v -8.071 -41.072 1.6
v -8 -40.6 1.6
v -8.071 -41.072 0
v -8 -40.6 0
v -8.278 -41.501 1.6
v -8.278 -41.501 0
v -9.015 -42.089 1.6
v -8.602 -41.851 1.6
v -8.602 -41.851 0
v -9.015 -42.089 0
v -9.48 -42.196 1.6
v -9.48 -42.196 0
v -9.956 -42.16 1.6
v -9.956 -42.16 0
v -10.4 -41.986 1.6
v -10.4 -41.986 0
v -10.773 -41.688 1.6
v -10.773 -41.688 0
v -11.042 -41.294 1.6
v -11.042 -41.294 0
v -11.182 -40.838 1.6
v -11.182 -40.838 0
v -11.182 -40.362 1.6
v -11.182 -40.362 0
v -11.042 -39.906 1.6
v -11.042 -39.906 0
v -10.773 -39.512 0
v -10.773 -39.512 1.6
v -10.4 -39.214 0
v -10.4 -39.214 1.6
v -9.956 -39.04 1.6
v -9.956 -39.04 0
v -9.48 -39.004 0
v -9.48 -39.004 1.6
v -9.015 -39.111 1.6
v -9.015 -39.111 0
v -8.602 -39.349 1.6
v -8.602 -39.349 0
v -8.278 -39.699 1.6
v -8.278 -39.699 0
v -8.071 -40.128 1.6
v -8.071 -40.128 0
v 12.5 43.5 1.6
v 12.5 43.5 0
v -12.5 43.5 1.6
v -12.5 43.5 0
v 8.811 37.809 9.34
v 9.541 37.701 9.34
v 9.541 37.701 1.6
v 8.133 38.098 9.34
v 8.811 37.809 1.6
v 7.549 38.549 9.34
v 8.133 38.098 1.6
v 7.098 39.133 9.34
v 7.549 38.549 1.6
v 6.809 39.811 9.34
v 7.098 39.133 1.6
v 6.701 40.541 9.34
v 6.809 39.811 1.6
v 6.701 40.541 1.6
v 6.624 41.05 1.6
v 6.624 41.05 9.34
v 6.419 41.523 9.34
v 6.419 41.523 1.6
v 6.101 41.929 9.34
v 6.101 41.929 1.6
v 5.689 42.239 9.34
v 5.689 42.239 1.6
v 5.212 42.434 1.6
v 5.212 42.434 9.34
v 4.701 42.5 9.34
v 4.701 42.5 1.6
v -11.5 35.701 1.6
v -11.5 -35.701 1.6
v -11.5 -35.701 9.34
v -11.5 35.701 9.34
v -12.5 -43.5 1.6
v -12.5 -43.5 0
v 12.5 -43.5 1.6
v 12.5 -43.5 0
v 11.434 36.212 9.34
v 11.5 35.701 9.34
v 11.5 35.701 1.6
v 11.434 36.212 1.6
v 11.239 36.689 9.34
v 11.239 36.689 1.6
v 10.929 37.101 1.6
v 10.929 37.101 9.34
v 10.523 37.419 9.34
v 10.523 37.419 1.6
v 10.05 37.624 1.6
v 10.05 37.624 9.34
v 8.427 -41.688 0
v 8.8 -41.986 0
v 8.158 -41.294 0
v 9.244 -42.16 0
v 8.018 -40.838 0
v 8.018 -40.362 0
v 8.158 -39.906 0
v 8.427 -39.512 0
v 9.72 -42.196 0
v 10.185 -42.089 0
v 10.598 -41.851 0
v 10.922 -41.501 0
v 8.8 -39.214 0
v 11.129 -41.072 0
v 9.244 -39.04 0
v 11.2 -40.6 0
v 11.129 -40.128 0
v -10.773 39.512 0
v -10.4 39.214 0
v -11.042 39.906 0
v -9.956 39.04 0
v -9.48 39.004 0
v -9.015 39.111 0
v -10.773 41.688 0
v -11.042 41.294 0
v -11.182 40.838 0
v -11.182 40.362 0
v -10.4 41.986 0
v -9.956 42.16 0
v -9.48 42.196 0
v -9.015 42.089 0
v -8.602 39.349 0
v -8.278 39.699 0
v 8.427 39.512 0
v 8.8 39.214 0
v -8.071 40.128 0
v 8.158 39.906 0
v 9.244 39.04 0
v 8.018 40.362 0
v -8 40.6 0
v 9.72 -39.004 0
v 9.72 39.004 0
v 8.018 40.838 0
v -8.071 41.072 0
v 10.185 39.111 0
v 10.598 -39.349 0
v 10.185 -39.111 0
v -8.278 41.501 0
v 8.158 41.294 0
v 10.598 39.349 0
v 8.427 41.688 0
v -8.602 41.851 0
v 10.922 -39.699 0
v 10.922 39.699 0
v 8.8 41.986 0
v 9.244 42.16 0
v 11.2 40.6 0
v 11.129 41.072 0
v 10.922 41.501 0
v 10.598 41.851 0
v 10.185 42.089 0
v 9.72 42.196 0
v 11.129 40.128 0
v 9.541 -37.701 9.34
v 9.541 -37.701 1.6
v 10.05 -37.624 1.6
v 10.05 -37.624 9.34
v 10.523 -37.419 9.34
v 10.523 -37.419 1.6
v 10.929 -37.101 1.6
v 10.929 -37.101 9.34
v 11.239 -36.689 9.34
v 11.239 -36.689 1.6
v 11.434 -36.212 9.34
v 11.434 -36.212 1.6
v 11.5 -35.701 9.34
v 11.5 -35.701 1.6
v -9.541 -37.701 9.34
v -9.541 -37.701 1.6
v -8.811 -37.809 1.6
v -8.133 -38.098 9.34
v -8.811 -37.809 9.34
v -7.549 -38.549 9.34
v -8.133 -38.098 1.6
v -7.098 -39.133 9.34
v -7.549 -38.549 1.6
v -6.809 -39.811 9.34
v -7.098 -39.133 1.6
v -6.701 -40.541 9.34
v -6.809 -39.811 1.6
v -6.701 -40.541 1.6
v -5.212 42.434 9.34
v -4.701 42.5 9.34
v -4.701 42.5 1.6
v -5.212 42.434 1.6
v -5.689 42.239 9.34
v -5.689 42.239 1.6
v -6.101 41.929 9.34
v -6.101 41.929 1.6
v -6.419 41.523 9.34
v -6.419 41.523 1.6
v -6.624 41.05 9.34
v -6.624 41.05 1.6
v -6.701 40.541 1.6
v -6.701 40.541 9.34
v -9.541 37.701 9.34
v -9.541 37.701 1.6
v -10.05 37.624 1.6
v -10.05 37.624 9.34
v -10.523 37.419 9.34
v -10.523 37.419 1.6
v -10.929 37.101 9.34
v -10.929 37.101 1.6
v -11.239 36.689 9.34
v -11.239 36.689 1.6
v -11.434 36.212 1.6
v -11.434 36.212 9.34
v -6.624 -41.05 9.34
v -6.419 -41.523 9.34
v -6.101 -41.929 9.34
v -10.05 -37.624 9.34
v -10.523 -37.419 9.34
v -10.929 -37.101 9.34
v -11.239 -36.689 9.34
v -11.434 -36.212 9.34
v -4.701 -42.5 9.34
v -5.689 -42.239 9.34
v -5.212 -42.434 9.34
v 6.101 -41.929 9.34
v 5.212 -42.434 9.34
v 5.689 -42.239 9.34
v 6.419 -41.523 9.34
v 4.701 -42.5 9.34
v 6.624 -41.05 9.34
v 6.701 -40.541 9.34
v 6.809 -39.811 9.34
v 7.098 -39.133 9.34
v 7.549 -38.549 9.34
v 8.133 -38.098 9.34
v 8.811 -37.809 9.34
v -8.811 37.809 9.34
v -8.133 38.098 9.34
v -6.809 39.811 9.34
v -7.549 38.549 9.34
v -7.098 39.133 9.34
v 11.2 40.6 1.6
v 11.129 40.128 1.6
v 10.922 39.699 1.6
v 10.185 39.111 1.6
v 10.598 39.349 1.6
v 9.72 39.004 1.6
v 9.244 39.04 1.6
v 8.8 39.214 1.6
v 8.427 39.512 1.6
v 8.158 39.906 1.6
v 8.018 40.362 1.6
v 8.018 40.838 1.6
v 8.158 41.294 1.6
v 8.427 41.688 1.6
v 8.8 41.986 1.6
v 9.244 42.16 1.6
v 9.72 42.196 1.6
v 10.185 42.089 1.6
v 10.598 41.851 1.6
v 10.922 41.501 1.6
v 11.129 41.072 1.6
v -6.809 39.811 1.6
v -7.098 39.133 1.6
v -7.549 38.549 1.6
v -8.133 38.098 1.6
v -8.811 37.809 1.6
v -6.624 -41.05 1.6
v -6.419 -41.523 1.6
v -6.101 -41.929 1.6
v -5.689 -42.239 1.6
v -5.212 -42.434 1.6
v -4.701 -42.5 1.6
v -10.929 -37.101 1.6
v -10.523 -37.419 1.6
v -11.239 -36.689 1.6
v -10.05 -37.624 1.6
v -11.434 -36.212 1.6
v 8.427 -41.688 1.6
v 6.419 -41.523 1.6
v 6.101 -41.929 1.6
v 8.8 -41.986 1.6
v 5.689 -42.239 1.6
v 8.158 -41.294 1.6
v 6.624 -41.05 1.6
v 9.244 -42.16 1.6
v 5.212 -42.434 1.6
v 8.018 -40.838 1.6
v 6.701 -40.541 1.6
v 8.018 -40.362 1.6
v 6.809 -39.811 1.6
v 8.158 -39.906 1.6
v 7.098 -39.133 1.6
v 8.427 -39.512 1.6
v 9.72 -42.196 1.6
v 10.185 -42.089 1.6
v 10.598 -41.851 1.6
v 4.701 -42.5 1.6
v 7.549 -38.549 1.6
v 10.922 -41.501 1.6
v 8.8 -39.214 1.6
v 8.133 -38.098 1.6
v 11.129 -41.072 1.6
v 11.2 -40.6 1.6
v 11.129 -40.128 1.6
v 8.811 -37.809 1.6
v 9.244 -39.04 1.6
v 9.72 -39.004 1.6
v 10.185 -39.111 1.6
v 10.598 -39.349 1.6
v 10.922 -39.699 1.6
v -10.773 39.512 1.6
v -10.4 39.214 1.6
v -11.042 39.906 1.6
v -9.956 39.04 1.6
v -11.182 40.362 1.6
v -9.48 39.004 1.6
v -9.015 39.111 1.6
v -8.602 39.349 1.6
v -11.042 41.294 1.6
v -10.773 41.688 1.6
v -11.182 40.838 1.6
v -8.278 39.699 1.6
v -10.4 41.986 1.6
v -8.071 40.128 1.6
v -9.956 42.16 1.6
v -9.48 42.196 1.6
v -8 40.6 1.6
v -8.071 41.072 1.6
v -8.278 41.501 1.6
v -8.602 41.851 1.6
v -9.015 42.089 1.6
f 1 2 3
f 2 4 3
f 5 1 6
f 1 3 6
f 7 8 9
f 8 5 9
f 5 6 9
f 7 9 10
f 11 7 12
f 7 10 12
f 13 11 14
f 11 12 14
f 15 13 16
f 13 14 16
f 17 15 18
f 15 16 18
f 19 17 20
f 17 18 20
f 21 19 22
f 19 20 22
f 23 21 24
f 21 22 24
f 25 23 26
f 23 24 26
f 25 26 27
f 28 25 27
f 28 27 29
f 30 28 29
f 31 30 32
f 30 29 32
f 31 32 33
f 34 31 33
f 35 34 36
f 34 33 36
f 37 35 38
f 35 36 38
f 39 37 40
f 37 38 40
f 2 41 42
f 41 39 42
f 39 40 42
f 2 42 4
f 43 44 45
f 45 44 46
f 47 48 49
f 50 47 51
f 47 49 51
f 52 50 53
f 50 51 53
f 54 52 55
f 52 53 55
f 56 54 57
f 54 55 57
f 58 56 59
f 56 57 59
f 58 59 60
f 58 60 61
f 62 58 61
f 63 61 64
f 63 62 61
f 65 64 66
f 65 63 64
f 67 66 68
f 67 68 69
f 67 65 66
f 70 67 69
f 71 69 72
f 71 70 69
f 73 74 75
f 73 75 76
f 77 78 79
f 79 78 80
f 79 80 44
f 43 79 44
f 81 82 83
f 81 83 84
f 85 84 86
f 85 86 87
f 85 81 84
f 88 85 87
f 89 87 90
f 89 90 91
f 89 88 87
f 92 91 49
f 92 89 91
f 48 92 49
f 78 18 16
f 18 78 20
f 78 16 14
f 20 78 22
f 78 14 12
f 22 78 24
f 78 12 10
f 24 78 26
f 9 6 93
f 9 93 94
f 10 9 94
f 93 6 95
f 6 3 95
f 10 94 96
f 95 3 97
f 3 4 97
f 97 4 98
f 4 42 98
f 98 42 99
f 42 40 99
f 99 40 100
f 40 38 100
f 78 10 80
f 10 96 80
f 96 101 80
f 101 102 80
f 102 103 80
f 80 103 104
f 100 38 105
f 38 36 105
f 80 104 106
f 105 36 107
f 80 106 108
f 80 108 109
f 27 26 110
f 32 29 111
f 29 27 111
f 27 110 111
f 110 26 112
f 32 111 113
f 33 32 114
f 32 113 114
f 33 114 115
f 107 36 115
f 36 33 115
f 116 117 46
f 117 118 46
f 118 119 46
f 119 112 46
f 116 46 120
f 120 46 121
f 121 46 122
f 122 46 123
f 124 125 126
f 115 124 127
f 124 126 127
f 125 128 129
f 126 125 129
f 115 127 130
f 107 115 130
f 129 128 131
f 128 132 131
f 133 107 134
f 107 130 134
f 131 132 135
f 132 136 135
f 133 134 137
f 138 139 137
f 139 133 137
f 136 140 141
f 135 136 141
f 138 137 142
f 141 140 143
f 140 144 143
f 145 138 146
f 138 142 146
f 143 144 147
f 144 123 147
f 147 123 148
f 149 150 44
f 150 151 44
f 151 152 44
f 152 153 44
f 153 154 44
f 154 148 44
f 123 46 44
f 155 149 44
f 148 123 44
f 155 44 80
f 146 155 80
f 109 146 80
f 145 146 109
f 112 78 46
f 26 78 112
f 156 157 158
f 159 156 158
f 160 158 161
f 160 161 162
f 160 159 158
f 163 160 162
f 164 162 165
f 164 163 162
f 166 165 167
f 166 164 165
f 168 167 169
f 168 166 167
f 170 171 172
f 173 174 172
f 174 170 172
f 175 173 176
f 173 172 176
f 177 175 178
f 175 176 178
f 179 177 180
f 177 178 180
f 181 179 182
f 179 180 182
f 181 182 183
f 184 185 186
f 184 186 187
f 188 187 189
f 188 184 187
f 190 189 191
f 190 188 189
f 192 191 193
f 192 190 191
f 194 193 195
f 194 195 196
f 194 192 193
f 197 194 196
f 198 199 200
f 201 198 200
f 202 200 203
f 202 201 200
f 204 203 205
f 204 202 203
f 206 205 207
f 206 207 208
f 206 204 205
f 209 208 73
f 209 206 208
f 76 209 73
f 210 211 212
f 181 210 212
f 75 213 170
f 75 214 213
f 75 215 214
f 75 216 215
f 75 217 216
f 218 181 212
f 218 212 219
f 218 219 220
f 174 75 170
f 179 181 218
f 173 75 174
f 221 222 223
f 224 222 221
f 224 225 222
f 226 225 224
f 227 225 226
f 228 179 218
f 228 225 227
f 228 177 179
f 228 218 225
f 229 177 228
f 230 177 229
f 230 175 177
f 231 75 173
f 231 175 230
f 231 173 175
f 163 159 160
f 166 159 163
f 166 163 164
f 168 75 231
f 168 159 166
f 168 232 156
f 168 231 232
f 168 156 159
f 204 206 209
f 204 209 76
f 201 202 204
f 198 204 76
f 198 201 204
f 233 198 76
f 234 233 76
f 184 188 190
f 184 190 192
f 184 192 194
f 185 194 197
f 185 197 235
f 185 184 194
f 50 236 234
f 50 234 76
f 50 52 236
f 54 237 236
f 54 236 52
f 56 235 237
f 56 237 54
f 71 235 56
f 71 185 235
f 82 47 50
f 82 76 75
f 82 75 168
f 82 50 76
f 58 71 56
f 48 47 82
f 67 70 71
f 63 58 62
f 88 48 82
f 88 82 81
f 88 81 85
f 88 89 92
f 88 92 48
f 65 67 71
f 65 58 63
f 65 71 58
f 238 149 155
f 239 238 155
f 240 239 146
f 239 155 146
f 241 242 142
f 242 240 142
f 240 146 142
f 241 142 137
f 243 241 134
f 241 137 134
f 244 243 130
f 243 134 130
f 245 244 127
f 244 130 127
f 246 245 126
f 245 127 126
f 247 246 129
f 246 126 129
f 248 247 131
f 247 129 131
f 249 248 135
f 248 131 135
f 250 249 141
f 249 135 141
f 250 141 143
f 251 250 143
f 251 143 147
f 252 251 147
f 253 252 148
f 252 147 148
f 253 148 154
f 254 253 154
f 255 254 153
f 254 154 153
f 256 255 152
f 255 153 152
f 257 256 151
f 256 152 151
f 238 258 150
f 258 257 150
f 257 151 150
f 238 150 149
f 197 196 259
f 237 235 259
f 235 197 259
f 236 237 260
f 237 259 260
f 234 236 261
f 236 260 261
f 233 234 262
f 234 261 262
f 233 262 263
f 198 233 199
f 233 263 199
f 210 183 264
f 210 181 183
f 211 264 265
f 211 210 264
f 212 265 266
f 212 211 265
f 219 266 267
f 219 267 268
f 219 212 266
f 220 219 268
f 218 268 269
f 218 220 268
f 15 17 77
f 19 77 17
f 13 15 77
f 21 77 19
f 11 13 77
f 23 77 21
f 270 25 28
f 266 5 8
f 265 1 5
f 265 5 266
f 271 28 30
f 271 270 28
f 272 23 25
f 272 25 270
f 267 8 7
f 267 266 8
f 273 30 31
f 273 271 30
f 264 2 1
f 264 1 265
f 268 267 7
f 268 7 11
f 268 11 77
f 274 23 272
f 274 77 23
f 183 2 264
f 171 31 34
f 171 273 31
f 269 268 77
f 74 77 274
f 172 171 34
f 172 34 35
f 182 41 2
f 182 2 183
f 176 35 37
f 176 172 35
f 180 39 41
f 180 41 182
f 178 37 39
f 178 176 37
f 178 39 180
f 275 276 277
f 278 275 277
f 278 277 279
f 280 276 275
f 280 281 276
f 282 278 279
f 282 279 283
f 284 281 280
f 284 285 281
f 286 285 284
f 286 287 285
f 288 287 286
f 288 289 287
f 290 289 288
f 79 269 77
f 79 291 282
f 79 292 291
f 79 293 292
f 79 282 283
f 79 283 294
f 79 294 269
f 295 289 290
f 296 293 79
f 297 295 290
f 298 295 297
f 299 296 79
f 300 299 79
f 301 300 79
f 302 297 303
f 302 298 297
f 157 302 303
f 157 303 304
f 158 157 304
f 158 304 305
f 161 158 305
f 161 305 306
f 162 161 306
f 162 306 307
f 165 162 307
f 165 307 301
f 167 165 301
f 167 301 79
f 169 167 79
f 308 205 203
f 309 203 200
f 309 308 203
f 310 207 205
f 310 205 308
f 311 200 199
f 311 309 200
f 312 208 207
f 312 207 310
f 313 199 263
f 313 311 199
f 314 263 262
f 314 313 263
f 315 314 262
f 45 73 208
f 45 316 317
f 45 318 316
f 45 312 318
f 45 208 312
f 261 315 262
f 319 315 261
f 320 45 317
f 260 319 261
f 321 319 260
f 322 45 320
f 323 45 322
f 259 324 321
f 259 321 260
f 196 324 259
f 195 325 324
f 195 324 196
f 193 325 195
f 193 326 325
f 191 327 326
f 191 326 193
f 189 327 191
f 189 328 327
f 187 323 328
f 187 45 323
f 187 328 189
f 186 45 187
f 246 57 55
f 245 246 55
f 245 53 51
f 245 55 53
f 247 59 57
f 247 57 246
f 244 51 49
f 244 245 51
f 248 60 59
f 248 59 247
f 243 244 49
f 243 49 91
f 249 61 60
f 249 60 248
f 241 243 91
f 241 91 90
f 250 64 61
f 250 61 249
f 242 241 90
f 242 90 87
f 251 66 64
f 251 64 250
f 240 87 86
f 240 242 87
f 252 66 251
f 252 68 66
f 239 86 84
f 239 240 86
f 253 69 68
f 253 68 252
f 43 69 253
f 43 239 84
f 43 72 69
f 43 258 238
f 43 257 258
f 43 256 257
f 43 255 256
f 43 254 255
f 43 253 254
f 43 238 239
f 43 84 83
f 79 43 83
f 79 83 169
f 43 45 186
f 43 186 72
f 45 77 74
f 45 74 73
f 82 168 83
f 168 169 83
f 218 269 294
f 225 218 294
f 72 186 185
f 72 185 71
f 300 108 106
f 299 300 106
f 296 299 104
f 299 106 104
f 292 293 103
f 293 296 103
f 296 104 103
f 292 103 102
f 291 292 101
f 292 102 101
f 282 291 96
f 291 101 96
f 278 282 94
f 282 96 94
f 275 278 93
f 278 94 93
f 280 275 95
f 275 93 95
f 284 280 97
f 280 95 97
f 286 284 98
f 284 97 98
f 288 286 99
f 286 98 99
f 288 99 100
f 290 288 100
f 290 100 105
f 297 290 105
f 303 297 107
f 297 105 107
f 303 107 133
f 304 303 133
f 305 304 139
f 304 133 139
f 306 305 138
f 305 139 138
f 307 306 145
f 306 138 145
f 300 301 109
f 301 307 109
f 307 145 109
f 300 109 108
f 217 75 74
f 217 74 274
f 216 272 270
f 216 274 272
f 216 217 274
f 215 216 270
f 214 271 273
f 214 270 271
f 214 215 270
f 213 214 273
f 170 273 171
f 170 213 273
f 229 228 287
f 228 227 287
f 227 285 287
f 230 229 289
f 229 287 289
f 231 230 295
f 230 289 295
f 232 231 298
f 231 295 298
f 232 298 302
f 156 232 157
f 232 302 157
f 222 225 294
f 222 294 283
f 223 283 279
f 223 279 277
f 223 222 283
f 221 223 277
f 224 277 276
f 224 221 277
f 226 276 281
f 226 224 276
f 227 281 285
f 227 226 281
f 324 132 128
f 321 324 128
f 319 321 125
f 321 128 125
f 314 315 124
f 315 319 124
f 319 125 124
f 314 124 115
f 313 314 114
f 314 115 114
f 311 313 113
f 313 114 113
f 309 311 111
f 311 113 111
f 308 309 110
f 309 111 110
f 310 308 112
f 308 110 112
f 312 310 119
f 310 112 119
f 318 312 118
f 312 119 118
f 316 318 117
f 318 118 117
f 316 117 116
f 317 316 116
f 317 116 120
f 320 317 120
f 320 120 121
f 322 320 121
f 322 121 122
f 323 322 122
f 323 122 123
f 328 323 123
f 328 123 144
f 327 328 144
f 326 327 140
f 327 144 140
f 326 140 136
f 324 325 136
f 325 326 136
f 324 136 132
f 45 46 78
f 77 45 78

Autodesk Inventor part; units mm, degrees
ref_plane "YZ Plane" through (0, 0, 0) normal (1, 0, 0) x (0, 1, 0)
ref_plane "XZ Plane" through (0, 0, 0) normal (0, 1, 0) x (-1, 0, 0)
ref_plane "XY Plane" through (0, 0, 0) normal (0, 0, 1) x (1, 0, 0)
sketch "スケッチ1" plane through (0, 0, 0) normal (0, 0, 1) x (1, 0, 0)
  line L0 (-12.5, -43.5) -> (12.5, -43.5)
  line L1 (12.5, -43.5) -> (12.5, 43.5)
  line L2 (12.5, 43.5) -> (-12.5, 43.5)
  line L3 (-12.5, 43.5) -> (-12.5, -43.5)
  line L4 (-12.5, -43.5) -> (12.5, 43.5) construction
  line L5 (12.5, -43.5) -> (-12.5, 43.5) construction
  line L6 (9.6, -40.6) -> (-9.6, -40.6) construction
  line L7 (-9.6, -40.6) -> (-9.6, 40.6) construction
  line L8 (-9.6, 40.6) -> (9.6, 40.6) construction
  line L9 (9.6, 40.6) -> (9.6, -40.6) construction
  line L10 (9.6, -40.6) -> (-9.6, 40.6) construction
  line L11 (-9.6, -40.6) -> (9.6, 40.6) construction
  circle A0 centre (-9.6, -40.6) radius 1.6
  circle A1 centre (-9.6, 40.6) radius 1.6
  circle A2 centre (9.6, 40.6) radius 1.6
  circle A3 centre (9.6, -40.6) radius 1.6
  arc A4 (-7.4091, -42.5) -> (-11.5, -38.4091) centre (-9.6, -40.6) ccw
  line L12 (-7.4091, -42.5) -> (7.4091, -42.5)
  line L13 (0, -43.5) -> (0, 43.5) construction
  line L14 (-12.5, 0) -> (12.5, 0) construction
  arc A5 (11.5, -38.4091) -> (7.4091, -42.5) centre (9.6, -40.6) ccw
  arc A6 (-11.5, 38.4091) -> (-7.4091, 42.5) centre (-9.6, 40.6) ccw
  line L15 (-7.4091, 42.5) -> (7.4091, 42.5)
  arc A7 (7.4091, 42.5) -> (11.5, 38.4091) centre (9.6, 40.6) ccw
  line L16 (-11.5, -38.4091) -> (-11.5, 38.4091)
  line L17 (11.5, -38.4091) -> (11.5, 38.4091)
  point P0 (0, 0)
  dimension "d0" = 25
  dimension "d1" = 87
  dimension "d2" = 19.2
  dimension "d3" = 81.2
  dimension "d4" = 3.2
  dimension "d5" = 1
  dimension "d6" = 1
extrude "押し出し1" add sketch "スケッチ1" along normal blind 1.6 contours L3 L2 L1 L0 | A4 L16 A6 L15 A7 L17 A5 L12
extrude "押し出し2" add sketch "スケッチ1" along normal blind 9.34 contours A4 L16 A6 L15 A7 L17 A5 L12
fillet "フィレット1" radius 2 8 edges at (11.5, -38.4091, 5.47) (7.4091, -42.5, 5.47) (-7.4091, -42.5, 5.47) (-11.5, -38.4091, 5.47) (11.5, 38.4091, 5.47) (7.4091, 42.5, 5.47) (-7.4091, 42.5, 5.47) (-11.5, 38.4091, 5.47)
equation "\"d6\" = d5"
properties part number "IMU-Measurement-and-Transmission-Module"
